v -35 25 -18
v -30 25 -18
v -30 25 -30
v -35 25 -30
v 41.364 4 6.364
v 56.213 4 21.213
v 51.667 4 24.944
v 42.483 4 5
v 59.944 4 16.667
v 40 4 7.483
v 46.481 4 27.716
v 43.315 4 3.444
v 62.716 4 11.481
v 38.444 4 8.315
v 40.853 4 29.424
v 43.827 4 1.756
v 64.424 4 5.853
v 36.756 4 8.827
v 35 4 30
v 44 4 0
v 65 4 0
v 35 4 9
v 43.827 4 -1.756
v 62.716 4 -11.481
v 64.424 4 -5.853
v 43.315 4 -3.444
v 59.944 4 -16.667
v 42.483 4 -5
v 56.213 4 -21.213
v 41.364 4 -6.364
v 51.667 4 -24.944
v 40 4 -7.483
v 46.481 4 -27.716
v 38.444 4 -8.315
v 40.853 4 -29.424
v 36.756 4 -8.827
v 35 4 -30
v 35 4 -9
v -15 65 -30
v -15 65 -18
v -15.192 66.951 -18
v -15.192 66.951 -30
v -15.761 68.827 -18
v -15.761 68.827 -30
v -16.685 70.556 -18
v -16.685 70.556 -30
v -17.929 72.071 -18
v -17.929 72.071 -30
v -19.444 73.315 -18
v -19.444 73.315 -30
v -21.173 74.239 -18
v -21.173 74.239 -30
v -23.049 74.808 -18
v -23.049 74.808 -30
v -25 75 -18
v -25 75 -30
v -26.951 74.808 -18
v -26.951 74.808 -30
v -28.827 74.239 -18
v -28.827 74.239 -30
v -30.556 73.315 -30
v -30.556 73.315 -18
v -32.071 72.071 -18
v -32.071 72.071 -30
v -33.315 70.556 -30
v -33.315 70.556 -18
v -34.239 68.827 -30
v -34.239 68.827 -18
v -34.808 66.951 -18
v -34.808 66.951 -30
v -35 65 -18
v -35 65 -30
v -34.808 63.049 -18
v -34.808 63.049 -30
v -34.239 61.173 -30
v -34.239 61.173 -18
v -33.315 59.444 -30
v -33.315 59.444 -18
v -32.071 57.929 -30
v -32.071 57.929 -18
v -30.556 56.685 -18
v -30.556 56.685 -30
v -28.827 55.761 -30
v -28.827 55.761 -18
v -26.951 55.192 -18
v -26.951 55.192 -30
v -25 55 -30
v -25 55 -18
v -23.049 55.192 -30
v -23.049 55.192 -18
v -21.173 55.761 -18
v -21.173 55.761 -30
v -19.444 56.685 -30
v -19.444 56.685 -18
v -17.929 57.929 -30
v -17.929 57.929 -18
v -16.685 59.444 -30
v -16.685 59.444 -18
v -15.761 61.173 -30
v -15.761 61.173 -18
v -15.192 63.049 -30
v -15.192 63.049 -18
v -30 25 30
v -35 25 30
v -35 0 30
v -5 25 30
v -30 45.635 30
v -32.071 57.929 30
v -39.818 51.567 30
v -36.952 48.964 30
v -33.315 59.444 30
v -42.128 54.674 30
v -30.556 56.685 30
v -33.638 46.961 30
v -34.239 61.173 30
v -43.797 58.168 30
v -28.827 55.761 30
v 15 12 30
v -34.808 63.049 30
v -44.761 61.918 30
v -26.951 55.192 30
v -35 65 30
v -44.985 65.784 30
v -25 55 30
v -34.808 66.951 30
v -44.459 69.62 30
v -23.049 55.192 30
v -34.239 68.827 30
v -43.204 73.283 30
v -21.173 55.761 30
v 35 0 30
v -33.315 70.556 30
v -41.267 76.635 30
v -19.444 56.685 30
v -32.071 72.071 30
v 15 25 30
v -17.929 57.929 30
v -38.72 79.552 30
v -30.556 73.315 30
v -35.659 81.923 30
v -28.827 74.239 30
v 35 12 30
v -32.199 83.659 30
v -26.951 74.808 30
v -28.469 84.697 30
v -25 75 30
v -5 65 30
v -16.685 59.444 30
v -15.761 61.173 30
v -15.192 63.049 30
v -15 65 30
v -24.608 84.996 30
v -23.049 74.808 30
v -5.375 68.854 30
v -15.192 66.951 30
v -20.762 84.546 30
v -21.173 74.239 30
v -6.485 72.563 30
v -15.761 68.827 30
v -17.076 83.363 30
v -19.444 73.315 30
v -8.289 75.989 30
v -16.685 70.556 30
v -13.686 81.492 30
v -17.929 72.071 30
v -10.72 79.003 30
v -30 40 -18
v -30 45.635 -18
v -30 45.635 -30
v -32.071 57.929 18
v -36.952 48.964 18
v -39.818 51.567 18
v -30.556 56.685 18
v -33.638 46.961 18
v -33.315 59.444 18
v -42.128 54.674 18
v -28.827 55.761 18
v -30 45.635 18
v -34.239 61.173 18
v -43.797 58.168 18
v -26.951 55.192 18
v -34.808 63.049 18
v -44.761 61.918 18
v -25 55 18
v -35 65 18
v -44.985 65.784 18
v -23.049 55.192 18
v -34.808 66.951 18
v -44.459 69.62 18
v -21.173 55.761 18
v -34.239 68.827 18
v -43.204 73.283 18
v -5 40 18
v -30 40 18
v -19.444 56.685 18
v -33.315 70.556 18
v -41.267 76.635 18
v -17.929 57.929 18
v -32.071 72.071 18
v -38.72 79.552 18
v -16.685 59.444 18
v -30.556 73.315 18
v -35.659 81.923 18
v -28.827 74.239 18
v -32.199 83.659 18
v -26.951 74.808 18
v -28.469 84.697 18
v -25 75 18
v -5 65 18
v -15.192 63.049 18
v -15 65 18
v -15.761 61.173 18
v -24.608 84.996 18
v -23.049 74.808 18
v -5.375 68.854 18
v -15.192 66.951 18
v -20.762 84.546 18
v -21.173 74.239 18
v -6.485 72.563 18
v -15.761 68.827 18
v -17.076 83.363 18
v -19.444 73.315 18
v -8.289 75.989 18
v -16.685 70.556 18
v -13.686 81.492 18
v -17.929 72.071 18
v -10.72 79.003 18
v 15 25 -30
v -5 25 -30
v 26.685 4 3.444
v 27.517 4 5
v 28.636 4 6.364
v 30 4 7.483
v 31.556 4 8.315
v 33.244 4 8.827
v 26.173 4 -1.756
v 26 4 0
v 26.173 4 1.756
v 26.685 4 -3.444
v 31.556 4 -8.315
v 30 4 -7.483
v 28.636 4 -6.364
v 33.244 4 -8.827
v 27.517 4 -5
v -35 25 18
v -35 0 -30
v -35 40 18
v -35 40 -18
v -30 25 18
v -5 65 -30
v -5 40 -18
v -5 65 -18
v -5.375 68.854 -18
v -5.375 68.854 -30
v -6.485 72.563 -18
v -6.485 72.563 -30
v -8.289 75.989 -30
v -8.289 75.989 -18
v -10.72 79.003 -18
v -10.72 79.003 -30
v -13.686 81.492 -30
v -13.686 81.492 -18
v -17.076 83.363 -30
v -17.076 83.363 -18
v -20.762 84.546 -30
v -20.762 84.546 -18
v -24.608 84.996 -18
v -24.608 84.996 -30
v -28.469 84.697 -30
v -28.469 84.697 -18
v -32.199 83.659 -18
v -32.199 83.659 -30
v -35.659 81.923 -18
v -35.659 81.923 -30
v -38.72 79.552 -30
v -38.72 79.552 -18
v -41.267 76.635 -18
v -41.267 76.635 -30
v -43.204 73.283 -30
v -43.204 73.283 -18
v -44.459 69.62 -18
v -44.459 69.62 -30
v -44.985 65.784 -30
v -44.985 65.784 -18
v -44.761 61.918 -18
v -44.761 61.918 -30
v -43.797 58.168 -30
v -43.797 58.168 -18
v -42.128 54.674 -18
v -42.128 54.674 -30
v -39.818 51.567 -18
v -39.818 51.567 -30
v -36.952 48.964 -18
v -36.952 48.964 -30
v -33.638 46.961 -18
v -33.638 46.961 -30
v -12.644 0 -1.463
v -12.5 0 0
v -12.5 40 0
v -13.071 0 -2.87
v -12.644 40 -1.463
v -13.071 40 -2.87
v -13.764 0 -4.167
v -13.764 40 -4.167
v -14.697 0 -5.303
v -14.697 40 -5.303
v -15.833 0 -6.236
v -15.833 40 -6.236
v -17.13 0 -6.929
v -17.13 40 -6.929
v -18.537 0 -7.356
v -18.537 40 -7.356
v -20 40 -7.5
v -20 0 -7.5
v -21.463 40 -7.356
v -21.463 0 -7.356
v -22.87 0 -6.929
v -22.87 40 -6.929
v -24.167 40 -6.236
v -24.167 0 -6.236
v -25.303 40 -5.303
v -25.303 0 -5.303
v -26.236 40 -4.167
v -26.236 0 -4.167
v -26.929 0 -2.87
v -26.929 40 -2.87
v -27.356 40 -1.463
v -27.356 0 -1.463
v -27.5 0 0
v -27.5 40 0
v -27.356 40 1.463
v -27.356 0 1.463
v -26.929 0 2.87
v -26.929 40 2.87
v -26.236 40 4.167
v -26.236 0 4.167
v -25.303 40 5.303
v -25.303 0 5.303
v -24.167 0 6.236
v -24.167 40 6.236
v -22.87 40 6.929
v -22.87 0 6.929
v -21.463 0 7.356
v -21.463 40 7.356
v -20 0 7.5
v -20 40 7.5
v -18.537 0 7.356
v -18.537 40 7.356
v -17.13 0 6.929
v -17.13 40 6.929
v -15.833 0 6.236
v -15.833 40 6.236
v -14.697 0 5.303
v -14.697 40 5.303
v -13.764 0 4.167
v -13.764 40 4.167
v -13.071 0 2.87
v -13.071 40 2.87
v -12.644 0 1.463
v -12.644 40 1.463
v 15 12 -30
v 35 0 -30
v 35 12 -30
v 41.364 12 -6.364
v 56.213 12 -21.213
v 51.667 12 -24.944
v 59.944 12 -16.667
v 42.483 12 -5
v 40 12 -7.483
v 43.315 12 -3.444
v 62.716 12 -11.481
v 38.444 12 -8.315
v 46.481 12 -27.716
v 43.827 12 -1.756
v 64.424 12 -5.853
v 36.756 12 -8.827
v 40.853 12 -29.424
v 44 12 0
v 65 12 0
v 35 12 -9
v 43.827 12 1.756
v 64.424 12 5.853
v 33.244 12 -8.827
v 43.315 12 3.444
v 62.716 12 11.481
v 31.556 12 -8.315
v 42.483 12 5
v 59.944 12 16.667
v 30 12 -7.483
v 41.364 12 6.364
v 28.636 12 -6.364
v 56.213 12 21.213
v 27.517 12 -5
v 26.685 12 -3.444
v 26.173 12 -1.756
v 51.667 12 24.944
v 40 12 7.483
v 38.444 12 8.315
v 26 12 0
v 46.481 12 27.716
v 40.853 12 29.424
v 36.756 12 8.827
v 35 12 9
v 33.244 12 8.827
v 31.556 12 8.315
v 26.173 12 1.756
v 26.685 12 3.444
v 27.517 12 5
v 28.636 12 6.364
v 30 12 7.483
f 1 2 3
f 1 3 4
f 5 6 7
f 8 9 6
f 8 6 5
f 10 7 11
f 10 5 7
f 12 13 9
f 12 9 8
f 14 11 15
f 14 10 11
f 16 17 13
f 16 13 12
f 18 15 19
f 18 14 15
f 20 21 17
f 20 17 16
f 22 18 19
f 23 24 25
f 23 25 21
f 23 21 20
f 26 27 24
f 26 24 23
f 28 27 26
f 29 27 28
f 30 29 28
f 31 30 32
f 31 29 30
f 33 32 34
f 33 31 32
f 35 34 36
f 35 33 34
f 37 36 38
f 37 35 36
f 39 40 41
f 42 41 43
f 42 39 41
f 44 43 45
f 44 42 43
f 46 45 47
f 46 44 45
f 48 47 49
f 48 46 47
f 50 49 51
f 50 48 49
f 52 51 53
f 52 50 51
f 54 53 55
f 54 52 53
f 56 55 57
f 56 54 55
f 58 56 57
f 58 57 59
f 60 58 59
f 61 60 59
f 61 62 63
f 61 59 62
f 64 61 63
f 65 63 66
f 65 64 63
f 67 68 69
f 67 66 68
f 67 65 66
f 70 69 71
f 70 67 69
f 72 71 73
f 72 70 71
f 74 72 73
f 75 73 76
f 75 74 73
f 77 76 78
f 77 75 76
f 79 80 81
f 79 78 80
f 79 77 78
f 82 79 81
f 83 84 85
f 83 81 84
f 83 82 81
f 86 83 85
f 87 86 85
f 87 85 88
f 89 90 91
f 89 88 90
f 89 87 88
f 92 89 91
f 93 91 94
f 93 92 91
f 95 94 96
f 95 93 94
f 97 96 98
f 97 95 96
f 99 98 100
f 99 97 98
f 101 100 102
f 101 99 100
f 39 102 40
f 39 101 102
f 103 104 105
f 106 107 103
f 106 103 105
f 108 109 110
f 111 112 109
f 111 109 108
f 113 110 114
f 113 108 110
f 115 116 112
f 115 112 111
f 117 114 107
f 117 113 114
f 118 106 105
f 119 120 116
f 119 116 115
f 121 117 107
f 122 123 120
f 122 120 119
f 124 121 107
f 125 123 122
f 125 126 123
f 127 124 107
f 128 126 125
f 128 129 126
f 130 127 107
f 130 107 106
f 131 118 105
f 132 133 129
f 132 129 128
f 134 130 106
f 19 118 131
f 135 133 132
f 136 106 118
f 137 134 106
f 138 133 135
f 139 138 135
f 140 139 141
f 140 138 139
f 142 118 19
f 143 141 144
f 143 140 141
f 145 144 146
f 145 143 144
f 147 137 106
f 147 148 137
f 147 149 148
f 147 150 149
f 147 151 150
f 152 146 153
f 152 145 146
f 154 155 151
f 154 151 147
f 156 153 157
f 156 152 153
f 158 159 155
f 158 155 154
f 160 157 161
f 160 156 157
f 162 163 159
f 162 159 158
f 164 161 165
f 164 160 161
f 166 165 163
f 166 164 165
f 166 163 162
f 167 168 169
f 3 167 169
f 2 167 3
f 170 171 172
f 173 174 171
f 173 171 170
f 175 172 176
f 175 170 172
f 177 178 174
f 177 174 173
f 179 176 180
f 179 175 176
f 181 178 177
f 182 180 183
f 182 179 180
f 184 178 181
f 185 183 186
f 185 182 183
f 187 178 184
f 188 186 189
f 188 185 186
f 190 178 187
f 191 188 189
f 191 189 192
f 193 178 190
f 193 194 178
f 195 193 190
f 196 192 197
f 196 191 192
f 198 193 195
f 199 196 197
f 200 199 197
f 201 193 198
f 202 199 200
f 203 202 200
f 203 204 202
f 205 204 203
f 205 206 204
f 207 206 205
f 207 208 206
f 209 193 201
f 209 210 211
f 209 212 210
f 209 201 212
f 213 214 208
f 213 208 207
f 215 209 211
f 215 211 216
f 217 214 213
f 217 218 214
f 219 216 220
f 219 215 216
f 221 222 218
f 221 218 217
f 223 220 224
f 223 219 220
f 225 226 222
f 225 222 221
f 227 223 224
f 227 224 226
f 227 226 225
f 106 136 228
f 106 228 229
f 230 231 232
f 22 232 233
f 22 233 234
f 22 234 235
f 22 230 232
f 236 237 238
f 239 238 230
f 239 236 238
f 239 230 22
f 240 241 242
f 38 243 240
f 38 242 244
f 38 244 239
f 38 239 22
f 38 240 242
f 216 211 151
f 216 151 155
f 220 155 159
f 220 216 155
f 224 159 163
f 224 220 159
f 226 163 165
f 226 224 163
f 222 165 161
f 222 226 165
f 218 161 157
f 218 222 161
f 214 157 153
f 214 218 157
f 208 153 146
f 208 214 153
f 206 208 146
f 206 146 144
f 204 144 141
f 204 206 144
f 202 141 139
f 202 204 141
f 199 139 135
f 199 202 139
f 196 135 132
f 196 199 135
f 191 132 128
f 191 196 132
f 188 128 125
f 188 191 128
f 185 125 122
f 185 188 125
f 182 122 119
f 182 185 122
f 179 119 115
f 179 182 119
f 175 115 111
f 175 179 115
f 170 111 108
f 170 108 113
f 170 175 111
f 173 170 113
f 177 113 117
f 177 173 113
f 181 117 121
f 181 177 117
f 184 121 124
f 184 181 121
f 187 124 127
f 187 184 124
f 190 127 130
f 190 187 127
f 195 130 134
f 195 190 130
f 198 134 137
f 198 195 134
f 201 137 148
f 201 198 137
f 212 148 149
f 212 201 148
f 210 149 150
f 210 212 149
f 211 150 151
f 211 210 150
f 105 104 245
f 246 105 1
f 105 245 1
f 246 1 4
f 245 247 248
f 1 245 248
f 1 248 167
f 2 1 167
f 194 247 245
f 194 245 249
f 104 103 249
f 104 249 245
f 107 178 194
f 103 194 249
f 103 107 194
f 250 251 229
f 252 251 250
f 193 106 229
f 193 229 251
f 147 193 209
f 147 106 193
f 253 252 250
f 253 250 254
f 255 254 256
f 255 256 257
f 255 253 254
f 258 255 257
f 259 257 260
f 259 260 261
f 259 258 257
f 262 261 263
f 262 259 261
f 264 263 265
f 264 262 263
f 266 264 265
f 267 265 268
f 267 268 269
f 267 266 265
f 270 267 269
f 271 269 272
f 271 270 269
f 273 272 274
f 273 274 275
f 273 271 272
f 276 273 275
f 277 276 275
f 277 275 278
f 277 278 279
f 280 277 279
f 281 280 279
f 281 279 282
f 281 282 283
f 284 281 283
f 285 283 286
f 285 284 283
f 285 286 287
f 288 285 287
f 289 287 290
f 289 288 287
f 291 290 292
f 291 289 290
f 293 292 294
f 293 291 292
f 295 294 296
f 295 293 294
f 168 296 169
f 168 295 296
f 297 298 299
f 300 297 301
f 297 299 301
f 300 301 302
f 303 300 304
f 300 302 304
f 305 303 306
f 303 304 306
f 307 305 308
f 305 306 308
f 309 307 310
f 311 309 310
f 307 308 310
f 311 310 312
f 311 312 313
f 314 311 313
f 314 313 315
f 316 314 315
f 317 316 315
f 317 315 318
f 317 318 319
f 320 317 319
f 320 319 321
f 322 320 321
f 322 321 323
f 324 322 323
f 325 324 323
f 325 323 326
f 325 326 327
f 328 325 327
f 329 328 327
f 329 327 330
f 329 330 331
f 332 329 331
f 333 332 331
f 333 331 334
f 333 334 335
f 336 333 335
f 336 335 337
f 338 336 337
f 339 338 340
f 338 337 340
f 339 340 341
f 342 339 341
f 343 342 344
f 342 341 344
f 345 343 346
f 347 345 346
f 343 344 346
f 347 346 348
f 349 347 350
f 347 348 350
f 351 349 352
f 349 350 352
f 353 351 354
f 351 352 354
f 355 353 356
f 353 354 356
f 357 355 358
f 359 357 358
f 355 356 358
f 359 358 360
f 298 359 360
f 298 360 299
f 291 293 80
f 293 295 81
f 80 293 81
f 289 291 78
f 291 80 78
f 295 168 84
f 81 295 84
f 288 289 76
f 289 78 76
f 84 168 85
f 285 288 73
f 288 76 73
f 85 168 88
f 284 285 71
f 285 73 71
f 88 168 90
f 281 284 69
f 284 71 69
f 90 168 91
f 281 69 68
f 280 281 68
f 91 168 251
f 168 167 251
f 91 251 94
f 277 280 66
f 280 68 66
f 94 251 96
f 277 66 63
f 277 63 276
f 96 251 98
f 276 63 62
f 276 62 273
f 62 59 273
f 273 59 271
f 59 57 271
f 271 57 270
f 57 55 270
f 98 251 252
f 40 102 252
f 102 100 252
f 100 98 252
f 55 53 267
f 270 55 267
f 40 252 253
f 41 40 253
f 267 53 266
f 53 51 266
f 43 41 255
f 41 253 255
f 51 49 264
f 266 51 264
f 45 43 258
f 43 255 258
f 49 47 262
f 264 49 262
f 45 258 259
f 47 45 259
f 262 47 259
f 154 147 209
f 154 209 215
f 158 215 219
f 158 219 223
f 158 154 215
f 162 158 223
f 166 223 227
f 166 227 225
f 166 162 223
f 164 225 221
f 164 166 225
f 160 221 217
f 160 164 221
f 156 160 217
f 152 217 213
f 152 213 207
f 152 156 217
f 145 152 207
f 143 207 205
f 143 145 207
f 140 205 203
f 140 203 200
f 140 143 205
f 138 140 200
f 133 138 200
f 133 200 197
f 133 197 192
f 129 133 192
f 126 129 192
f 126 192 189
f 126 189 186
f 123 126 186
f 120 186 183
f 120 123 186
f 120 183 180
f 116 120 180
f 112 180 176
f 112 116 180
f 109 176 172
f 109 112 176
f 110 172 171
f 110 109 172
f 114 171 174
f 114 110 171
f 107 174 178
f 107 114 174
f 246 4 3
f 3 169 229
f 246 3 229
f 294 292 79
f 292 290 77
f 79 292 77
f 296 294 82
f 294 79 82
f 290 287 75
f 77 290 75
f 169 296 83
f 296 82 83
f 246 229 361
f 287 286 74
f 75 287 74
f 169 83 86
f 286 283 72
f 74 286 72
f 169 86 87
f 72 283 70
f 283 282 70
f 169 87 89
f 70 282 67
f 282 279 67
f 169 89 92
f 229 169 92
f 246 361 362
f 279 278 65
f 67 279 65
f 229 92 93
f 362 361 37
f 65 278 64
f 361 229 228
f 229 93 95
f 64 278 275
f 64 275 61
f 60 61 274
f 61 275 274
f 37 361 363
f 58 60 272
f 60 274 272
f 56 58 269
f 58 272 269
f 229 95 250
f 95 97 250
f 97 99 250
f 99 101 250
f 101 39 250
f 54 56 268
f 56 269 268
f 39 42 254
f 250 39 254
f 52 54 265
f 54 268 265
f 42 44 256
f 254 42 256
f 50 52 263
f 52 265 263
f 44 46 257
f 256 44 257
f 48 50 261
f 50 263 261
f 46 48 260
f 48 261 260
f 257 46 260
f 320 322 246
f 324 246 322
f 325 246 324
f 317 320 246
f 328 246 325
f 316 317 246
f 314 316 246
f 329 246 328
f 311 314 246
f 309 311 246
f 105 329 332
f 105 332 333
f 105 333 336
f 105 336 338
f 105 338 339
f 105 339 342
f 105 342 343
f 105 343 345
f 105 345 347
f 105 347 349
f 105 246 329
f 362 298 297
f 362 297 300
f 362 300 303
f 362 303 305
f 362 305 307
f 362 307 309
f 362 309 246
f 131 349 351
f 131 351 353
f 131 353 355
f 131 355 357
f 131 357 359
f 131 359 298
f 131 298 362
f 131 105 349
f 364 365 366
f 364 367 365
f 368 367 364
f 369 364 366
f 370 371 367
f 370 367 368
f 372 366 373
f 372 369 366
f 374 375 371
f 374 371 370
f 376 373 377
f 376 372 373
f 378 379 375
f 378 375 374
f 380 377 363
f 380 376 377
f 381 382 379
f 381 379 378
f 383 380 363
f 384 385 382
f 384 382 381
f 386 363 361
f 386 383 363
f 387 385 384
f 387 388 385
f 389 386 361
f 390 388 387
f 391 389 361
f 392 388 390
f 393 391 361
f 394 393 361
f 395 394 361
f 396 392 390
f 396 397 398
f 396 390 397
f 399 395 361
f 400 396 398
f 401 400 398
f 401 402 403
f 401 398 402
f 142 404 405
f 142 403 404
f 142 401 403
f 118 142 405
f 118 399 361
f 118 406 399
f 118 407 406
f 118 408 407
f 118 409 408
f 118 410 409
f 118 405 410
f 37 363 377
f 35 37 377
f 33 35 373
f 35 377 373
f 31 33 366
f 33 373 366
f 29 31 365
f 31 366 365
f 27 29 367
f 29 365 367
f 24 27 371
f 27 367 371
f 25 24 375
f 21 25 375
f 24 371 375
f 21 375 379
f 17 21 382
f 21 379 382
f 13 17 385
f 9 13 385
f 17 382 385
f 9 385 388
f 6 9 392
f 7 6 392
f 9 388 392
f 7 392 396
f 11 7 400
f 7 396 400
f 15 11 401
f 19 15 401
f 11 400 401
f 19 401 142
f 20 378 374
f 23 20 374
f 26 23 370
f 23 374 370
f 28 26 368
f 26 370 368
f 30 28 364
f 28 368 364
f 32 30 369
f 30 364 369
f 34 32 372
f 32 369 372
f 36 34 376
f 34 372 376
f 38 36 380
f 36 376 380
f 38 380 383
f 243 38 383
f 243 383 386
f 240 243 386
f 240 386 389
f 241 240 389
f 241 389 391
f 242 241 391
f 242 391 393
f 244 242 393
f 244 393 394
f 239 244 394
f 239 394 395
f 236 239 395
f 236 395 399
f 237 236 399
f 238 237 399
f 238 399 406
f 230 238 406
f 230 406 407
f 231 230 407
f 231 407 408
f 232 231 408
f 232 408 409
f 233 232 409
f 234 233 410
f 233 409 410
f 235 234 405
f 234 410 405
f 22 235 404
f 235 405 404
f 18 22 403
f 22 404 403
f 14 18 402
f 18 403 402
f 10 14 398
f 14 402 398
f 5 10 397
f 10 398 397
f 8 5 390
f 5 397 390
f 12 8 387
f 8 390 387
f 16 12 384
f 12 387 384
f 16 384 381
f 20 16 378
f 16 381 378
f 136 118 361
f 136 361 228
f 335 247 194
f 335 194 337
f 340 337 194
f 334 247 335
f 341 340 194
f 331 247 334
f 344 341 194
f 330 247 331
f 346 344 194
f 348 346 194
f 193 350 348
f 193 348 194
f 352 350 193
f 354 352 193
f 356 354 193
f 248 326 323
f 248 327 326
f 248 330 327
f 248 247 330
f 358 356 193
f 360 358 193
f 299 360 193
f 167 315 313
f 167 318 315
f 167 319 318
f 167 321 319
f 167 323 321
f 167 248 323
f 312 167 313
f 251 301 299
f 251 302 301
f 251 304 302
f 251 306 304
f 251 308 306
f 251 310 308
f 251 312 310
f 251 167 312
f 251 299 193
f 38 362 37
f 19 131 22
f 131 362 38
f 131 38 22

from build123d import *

# Parameters (mm, degrees)
SKETCH1_R           = 10
BOSS_EXTRUDE1_DEPTH = 30
BOSS_EXTRUDE3_DEPTH = 8
SKETCH4_R           = 9
CUT_EXTRUDE5_DEPTH  = 8
SKETCH7_W           = 36
SKETCH7_H           = 64.778485803
CUT_EXTRUDE6_DEPTH  = 41
SKETCH8_W           = 30
SKETCH8_H           = 36
BOSS_EXTRUDE5_DEPTH = 15
SKETCH9_R           = 7.5
CUT_EXTRUDE8_DEPTH  = 41


with BuildPart() as part:
    # Sketch1 → Boss-Extrude1 (new body, symmetric)
    with BuildSketch(Plane.XY):
        with BuildLine():
            Line((-35, 25), (-35, 0))
            Line((-35, 0), (35, 0))
            Line((35, 0), (35, 12))
            Line((35, 12), (15, 12))
            Line((15, 12), (15, 25))
            Line((15, 25), (-5, 25))
            Line((-5, 25), (-5, 40))
            Line((-5, 40), (-5, 65))
            ThreePointArc((-5, 65), (-37.247448714, 80.811388301), (-30, 45.635083269))
            Line((-30, 45.635083269), (-30, 40))
            Line((-30, 40), (-30, 25))
            Line((-30, 25), (-35, 25))
        make_face()
        with Locations((-25, 65)):
            Circle(SKETCH1_R, mode=Mode.SUBTRACT)
    extrude(amount=BOSS_EXTRUDE1_DEPTH, both=True)

    # Sketch3 → Boss-Extrude3 (add)
    with BuildSketch(Plane(origin=(0, 12, 0), x_dir=(1, 0, 0), z_dir=(0, 1, 0))):
        with BuildLine():
            Line((15, 30), (35, 30))
            ThreePointArc((35, 30), (65, 0), (35, -30))
            Line((35, -30), (15, -30))
            Line((15, -30), (15, 30))
        make_face()
    extrude(amount=-BOSS_EXTRUDE3_DEPTH)

    # Sketch4 → Cut-Extrude5 (cut)
    with BuildSketch(Plane(origin=(0, 12, 0), x_dir=(1, 0, 0), z_dir=(0, 1, 0))):
        with Locations((35, 0)):
            Circle(SKETCH4_R)
    extrude(amount=-CUT_EXTRUDE5_DEPTH, mode=Mode.SUBTRACT)

    # Sketch7 → Cut-Extrude6 (cut, through all)
    with BuildSketch(Plane(origin=(-5, 0, 0), x_dir=(0, 0, -1), z_dir=(1, 0, 0))):
        with Locations((0, 72.389242902)):
            Rectangle(SKETCH7_W, SKETCH7_H)
    extrude(amount=-CUT_EXTRUDE6_DEPTH, mode=Mode.SUBTRACT)

    # Sketch8 → Boss-Extrude5 (add)
    with BuildSketch(Plane(origin=(0, 40, 0), x_dir=(1, 0, 0), z_dir=(0, 1, 0))):
        with Locations((-20, 0)):
            Rectangle(SKETCH8_W, SKETCH8_H)
    extrude(amount=-BOSS_EXTRUDE5_DEPTH)

    # Sketch9 → Cut-Extrude8 (cut, through all)
    with BuildSketch(Plane(origin=(0, 40, 0), x_dir=(1, 0, 0), z_dir=(0, 1, 0))):
        with Locations((-20, 0)):
            Circle(SKETCH9_R)
    extrude(amount=-CUT_EXTRUDE8_DEPTH, mode=Mode.SUBTRACT)


solid = part.part
